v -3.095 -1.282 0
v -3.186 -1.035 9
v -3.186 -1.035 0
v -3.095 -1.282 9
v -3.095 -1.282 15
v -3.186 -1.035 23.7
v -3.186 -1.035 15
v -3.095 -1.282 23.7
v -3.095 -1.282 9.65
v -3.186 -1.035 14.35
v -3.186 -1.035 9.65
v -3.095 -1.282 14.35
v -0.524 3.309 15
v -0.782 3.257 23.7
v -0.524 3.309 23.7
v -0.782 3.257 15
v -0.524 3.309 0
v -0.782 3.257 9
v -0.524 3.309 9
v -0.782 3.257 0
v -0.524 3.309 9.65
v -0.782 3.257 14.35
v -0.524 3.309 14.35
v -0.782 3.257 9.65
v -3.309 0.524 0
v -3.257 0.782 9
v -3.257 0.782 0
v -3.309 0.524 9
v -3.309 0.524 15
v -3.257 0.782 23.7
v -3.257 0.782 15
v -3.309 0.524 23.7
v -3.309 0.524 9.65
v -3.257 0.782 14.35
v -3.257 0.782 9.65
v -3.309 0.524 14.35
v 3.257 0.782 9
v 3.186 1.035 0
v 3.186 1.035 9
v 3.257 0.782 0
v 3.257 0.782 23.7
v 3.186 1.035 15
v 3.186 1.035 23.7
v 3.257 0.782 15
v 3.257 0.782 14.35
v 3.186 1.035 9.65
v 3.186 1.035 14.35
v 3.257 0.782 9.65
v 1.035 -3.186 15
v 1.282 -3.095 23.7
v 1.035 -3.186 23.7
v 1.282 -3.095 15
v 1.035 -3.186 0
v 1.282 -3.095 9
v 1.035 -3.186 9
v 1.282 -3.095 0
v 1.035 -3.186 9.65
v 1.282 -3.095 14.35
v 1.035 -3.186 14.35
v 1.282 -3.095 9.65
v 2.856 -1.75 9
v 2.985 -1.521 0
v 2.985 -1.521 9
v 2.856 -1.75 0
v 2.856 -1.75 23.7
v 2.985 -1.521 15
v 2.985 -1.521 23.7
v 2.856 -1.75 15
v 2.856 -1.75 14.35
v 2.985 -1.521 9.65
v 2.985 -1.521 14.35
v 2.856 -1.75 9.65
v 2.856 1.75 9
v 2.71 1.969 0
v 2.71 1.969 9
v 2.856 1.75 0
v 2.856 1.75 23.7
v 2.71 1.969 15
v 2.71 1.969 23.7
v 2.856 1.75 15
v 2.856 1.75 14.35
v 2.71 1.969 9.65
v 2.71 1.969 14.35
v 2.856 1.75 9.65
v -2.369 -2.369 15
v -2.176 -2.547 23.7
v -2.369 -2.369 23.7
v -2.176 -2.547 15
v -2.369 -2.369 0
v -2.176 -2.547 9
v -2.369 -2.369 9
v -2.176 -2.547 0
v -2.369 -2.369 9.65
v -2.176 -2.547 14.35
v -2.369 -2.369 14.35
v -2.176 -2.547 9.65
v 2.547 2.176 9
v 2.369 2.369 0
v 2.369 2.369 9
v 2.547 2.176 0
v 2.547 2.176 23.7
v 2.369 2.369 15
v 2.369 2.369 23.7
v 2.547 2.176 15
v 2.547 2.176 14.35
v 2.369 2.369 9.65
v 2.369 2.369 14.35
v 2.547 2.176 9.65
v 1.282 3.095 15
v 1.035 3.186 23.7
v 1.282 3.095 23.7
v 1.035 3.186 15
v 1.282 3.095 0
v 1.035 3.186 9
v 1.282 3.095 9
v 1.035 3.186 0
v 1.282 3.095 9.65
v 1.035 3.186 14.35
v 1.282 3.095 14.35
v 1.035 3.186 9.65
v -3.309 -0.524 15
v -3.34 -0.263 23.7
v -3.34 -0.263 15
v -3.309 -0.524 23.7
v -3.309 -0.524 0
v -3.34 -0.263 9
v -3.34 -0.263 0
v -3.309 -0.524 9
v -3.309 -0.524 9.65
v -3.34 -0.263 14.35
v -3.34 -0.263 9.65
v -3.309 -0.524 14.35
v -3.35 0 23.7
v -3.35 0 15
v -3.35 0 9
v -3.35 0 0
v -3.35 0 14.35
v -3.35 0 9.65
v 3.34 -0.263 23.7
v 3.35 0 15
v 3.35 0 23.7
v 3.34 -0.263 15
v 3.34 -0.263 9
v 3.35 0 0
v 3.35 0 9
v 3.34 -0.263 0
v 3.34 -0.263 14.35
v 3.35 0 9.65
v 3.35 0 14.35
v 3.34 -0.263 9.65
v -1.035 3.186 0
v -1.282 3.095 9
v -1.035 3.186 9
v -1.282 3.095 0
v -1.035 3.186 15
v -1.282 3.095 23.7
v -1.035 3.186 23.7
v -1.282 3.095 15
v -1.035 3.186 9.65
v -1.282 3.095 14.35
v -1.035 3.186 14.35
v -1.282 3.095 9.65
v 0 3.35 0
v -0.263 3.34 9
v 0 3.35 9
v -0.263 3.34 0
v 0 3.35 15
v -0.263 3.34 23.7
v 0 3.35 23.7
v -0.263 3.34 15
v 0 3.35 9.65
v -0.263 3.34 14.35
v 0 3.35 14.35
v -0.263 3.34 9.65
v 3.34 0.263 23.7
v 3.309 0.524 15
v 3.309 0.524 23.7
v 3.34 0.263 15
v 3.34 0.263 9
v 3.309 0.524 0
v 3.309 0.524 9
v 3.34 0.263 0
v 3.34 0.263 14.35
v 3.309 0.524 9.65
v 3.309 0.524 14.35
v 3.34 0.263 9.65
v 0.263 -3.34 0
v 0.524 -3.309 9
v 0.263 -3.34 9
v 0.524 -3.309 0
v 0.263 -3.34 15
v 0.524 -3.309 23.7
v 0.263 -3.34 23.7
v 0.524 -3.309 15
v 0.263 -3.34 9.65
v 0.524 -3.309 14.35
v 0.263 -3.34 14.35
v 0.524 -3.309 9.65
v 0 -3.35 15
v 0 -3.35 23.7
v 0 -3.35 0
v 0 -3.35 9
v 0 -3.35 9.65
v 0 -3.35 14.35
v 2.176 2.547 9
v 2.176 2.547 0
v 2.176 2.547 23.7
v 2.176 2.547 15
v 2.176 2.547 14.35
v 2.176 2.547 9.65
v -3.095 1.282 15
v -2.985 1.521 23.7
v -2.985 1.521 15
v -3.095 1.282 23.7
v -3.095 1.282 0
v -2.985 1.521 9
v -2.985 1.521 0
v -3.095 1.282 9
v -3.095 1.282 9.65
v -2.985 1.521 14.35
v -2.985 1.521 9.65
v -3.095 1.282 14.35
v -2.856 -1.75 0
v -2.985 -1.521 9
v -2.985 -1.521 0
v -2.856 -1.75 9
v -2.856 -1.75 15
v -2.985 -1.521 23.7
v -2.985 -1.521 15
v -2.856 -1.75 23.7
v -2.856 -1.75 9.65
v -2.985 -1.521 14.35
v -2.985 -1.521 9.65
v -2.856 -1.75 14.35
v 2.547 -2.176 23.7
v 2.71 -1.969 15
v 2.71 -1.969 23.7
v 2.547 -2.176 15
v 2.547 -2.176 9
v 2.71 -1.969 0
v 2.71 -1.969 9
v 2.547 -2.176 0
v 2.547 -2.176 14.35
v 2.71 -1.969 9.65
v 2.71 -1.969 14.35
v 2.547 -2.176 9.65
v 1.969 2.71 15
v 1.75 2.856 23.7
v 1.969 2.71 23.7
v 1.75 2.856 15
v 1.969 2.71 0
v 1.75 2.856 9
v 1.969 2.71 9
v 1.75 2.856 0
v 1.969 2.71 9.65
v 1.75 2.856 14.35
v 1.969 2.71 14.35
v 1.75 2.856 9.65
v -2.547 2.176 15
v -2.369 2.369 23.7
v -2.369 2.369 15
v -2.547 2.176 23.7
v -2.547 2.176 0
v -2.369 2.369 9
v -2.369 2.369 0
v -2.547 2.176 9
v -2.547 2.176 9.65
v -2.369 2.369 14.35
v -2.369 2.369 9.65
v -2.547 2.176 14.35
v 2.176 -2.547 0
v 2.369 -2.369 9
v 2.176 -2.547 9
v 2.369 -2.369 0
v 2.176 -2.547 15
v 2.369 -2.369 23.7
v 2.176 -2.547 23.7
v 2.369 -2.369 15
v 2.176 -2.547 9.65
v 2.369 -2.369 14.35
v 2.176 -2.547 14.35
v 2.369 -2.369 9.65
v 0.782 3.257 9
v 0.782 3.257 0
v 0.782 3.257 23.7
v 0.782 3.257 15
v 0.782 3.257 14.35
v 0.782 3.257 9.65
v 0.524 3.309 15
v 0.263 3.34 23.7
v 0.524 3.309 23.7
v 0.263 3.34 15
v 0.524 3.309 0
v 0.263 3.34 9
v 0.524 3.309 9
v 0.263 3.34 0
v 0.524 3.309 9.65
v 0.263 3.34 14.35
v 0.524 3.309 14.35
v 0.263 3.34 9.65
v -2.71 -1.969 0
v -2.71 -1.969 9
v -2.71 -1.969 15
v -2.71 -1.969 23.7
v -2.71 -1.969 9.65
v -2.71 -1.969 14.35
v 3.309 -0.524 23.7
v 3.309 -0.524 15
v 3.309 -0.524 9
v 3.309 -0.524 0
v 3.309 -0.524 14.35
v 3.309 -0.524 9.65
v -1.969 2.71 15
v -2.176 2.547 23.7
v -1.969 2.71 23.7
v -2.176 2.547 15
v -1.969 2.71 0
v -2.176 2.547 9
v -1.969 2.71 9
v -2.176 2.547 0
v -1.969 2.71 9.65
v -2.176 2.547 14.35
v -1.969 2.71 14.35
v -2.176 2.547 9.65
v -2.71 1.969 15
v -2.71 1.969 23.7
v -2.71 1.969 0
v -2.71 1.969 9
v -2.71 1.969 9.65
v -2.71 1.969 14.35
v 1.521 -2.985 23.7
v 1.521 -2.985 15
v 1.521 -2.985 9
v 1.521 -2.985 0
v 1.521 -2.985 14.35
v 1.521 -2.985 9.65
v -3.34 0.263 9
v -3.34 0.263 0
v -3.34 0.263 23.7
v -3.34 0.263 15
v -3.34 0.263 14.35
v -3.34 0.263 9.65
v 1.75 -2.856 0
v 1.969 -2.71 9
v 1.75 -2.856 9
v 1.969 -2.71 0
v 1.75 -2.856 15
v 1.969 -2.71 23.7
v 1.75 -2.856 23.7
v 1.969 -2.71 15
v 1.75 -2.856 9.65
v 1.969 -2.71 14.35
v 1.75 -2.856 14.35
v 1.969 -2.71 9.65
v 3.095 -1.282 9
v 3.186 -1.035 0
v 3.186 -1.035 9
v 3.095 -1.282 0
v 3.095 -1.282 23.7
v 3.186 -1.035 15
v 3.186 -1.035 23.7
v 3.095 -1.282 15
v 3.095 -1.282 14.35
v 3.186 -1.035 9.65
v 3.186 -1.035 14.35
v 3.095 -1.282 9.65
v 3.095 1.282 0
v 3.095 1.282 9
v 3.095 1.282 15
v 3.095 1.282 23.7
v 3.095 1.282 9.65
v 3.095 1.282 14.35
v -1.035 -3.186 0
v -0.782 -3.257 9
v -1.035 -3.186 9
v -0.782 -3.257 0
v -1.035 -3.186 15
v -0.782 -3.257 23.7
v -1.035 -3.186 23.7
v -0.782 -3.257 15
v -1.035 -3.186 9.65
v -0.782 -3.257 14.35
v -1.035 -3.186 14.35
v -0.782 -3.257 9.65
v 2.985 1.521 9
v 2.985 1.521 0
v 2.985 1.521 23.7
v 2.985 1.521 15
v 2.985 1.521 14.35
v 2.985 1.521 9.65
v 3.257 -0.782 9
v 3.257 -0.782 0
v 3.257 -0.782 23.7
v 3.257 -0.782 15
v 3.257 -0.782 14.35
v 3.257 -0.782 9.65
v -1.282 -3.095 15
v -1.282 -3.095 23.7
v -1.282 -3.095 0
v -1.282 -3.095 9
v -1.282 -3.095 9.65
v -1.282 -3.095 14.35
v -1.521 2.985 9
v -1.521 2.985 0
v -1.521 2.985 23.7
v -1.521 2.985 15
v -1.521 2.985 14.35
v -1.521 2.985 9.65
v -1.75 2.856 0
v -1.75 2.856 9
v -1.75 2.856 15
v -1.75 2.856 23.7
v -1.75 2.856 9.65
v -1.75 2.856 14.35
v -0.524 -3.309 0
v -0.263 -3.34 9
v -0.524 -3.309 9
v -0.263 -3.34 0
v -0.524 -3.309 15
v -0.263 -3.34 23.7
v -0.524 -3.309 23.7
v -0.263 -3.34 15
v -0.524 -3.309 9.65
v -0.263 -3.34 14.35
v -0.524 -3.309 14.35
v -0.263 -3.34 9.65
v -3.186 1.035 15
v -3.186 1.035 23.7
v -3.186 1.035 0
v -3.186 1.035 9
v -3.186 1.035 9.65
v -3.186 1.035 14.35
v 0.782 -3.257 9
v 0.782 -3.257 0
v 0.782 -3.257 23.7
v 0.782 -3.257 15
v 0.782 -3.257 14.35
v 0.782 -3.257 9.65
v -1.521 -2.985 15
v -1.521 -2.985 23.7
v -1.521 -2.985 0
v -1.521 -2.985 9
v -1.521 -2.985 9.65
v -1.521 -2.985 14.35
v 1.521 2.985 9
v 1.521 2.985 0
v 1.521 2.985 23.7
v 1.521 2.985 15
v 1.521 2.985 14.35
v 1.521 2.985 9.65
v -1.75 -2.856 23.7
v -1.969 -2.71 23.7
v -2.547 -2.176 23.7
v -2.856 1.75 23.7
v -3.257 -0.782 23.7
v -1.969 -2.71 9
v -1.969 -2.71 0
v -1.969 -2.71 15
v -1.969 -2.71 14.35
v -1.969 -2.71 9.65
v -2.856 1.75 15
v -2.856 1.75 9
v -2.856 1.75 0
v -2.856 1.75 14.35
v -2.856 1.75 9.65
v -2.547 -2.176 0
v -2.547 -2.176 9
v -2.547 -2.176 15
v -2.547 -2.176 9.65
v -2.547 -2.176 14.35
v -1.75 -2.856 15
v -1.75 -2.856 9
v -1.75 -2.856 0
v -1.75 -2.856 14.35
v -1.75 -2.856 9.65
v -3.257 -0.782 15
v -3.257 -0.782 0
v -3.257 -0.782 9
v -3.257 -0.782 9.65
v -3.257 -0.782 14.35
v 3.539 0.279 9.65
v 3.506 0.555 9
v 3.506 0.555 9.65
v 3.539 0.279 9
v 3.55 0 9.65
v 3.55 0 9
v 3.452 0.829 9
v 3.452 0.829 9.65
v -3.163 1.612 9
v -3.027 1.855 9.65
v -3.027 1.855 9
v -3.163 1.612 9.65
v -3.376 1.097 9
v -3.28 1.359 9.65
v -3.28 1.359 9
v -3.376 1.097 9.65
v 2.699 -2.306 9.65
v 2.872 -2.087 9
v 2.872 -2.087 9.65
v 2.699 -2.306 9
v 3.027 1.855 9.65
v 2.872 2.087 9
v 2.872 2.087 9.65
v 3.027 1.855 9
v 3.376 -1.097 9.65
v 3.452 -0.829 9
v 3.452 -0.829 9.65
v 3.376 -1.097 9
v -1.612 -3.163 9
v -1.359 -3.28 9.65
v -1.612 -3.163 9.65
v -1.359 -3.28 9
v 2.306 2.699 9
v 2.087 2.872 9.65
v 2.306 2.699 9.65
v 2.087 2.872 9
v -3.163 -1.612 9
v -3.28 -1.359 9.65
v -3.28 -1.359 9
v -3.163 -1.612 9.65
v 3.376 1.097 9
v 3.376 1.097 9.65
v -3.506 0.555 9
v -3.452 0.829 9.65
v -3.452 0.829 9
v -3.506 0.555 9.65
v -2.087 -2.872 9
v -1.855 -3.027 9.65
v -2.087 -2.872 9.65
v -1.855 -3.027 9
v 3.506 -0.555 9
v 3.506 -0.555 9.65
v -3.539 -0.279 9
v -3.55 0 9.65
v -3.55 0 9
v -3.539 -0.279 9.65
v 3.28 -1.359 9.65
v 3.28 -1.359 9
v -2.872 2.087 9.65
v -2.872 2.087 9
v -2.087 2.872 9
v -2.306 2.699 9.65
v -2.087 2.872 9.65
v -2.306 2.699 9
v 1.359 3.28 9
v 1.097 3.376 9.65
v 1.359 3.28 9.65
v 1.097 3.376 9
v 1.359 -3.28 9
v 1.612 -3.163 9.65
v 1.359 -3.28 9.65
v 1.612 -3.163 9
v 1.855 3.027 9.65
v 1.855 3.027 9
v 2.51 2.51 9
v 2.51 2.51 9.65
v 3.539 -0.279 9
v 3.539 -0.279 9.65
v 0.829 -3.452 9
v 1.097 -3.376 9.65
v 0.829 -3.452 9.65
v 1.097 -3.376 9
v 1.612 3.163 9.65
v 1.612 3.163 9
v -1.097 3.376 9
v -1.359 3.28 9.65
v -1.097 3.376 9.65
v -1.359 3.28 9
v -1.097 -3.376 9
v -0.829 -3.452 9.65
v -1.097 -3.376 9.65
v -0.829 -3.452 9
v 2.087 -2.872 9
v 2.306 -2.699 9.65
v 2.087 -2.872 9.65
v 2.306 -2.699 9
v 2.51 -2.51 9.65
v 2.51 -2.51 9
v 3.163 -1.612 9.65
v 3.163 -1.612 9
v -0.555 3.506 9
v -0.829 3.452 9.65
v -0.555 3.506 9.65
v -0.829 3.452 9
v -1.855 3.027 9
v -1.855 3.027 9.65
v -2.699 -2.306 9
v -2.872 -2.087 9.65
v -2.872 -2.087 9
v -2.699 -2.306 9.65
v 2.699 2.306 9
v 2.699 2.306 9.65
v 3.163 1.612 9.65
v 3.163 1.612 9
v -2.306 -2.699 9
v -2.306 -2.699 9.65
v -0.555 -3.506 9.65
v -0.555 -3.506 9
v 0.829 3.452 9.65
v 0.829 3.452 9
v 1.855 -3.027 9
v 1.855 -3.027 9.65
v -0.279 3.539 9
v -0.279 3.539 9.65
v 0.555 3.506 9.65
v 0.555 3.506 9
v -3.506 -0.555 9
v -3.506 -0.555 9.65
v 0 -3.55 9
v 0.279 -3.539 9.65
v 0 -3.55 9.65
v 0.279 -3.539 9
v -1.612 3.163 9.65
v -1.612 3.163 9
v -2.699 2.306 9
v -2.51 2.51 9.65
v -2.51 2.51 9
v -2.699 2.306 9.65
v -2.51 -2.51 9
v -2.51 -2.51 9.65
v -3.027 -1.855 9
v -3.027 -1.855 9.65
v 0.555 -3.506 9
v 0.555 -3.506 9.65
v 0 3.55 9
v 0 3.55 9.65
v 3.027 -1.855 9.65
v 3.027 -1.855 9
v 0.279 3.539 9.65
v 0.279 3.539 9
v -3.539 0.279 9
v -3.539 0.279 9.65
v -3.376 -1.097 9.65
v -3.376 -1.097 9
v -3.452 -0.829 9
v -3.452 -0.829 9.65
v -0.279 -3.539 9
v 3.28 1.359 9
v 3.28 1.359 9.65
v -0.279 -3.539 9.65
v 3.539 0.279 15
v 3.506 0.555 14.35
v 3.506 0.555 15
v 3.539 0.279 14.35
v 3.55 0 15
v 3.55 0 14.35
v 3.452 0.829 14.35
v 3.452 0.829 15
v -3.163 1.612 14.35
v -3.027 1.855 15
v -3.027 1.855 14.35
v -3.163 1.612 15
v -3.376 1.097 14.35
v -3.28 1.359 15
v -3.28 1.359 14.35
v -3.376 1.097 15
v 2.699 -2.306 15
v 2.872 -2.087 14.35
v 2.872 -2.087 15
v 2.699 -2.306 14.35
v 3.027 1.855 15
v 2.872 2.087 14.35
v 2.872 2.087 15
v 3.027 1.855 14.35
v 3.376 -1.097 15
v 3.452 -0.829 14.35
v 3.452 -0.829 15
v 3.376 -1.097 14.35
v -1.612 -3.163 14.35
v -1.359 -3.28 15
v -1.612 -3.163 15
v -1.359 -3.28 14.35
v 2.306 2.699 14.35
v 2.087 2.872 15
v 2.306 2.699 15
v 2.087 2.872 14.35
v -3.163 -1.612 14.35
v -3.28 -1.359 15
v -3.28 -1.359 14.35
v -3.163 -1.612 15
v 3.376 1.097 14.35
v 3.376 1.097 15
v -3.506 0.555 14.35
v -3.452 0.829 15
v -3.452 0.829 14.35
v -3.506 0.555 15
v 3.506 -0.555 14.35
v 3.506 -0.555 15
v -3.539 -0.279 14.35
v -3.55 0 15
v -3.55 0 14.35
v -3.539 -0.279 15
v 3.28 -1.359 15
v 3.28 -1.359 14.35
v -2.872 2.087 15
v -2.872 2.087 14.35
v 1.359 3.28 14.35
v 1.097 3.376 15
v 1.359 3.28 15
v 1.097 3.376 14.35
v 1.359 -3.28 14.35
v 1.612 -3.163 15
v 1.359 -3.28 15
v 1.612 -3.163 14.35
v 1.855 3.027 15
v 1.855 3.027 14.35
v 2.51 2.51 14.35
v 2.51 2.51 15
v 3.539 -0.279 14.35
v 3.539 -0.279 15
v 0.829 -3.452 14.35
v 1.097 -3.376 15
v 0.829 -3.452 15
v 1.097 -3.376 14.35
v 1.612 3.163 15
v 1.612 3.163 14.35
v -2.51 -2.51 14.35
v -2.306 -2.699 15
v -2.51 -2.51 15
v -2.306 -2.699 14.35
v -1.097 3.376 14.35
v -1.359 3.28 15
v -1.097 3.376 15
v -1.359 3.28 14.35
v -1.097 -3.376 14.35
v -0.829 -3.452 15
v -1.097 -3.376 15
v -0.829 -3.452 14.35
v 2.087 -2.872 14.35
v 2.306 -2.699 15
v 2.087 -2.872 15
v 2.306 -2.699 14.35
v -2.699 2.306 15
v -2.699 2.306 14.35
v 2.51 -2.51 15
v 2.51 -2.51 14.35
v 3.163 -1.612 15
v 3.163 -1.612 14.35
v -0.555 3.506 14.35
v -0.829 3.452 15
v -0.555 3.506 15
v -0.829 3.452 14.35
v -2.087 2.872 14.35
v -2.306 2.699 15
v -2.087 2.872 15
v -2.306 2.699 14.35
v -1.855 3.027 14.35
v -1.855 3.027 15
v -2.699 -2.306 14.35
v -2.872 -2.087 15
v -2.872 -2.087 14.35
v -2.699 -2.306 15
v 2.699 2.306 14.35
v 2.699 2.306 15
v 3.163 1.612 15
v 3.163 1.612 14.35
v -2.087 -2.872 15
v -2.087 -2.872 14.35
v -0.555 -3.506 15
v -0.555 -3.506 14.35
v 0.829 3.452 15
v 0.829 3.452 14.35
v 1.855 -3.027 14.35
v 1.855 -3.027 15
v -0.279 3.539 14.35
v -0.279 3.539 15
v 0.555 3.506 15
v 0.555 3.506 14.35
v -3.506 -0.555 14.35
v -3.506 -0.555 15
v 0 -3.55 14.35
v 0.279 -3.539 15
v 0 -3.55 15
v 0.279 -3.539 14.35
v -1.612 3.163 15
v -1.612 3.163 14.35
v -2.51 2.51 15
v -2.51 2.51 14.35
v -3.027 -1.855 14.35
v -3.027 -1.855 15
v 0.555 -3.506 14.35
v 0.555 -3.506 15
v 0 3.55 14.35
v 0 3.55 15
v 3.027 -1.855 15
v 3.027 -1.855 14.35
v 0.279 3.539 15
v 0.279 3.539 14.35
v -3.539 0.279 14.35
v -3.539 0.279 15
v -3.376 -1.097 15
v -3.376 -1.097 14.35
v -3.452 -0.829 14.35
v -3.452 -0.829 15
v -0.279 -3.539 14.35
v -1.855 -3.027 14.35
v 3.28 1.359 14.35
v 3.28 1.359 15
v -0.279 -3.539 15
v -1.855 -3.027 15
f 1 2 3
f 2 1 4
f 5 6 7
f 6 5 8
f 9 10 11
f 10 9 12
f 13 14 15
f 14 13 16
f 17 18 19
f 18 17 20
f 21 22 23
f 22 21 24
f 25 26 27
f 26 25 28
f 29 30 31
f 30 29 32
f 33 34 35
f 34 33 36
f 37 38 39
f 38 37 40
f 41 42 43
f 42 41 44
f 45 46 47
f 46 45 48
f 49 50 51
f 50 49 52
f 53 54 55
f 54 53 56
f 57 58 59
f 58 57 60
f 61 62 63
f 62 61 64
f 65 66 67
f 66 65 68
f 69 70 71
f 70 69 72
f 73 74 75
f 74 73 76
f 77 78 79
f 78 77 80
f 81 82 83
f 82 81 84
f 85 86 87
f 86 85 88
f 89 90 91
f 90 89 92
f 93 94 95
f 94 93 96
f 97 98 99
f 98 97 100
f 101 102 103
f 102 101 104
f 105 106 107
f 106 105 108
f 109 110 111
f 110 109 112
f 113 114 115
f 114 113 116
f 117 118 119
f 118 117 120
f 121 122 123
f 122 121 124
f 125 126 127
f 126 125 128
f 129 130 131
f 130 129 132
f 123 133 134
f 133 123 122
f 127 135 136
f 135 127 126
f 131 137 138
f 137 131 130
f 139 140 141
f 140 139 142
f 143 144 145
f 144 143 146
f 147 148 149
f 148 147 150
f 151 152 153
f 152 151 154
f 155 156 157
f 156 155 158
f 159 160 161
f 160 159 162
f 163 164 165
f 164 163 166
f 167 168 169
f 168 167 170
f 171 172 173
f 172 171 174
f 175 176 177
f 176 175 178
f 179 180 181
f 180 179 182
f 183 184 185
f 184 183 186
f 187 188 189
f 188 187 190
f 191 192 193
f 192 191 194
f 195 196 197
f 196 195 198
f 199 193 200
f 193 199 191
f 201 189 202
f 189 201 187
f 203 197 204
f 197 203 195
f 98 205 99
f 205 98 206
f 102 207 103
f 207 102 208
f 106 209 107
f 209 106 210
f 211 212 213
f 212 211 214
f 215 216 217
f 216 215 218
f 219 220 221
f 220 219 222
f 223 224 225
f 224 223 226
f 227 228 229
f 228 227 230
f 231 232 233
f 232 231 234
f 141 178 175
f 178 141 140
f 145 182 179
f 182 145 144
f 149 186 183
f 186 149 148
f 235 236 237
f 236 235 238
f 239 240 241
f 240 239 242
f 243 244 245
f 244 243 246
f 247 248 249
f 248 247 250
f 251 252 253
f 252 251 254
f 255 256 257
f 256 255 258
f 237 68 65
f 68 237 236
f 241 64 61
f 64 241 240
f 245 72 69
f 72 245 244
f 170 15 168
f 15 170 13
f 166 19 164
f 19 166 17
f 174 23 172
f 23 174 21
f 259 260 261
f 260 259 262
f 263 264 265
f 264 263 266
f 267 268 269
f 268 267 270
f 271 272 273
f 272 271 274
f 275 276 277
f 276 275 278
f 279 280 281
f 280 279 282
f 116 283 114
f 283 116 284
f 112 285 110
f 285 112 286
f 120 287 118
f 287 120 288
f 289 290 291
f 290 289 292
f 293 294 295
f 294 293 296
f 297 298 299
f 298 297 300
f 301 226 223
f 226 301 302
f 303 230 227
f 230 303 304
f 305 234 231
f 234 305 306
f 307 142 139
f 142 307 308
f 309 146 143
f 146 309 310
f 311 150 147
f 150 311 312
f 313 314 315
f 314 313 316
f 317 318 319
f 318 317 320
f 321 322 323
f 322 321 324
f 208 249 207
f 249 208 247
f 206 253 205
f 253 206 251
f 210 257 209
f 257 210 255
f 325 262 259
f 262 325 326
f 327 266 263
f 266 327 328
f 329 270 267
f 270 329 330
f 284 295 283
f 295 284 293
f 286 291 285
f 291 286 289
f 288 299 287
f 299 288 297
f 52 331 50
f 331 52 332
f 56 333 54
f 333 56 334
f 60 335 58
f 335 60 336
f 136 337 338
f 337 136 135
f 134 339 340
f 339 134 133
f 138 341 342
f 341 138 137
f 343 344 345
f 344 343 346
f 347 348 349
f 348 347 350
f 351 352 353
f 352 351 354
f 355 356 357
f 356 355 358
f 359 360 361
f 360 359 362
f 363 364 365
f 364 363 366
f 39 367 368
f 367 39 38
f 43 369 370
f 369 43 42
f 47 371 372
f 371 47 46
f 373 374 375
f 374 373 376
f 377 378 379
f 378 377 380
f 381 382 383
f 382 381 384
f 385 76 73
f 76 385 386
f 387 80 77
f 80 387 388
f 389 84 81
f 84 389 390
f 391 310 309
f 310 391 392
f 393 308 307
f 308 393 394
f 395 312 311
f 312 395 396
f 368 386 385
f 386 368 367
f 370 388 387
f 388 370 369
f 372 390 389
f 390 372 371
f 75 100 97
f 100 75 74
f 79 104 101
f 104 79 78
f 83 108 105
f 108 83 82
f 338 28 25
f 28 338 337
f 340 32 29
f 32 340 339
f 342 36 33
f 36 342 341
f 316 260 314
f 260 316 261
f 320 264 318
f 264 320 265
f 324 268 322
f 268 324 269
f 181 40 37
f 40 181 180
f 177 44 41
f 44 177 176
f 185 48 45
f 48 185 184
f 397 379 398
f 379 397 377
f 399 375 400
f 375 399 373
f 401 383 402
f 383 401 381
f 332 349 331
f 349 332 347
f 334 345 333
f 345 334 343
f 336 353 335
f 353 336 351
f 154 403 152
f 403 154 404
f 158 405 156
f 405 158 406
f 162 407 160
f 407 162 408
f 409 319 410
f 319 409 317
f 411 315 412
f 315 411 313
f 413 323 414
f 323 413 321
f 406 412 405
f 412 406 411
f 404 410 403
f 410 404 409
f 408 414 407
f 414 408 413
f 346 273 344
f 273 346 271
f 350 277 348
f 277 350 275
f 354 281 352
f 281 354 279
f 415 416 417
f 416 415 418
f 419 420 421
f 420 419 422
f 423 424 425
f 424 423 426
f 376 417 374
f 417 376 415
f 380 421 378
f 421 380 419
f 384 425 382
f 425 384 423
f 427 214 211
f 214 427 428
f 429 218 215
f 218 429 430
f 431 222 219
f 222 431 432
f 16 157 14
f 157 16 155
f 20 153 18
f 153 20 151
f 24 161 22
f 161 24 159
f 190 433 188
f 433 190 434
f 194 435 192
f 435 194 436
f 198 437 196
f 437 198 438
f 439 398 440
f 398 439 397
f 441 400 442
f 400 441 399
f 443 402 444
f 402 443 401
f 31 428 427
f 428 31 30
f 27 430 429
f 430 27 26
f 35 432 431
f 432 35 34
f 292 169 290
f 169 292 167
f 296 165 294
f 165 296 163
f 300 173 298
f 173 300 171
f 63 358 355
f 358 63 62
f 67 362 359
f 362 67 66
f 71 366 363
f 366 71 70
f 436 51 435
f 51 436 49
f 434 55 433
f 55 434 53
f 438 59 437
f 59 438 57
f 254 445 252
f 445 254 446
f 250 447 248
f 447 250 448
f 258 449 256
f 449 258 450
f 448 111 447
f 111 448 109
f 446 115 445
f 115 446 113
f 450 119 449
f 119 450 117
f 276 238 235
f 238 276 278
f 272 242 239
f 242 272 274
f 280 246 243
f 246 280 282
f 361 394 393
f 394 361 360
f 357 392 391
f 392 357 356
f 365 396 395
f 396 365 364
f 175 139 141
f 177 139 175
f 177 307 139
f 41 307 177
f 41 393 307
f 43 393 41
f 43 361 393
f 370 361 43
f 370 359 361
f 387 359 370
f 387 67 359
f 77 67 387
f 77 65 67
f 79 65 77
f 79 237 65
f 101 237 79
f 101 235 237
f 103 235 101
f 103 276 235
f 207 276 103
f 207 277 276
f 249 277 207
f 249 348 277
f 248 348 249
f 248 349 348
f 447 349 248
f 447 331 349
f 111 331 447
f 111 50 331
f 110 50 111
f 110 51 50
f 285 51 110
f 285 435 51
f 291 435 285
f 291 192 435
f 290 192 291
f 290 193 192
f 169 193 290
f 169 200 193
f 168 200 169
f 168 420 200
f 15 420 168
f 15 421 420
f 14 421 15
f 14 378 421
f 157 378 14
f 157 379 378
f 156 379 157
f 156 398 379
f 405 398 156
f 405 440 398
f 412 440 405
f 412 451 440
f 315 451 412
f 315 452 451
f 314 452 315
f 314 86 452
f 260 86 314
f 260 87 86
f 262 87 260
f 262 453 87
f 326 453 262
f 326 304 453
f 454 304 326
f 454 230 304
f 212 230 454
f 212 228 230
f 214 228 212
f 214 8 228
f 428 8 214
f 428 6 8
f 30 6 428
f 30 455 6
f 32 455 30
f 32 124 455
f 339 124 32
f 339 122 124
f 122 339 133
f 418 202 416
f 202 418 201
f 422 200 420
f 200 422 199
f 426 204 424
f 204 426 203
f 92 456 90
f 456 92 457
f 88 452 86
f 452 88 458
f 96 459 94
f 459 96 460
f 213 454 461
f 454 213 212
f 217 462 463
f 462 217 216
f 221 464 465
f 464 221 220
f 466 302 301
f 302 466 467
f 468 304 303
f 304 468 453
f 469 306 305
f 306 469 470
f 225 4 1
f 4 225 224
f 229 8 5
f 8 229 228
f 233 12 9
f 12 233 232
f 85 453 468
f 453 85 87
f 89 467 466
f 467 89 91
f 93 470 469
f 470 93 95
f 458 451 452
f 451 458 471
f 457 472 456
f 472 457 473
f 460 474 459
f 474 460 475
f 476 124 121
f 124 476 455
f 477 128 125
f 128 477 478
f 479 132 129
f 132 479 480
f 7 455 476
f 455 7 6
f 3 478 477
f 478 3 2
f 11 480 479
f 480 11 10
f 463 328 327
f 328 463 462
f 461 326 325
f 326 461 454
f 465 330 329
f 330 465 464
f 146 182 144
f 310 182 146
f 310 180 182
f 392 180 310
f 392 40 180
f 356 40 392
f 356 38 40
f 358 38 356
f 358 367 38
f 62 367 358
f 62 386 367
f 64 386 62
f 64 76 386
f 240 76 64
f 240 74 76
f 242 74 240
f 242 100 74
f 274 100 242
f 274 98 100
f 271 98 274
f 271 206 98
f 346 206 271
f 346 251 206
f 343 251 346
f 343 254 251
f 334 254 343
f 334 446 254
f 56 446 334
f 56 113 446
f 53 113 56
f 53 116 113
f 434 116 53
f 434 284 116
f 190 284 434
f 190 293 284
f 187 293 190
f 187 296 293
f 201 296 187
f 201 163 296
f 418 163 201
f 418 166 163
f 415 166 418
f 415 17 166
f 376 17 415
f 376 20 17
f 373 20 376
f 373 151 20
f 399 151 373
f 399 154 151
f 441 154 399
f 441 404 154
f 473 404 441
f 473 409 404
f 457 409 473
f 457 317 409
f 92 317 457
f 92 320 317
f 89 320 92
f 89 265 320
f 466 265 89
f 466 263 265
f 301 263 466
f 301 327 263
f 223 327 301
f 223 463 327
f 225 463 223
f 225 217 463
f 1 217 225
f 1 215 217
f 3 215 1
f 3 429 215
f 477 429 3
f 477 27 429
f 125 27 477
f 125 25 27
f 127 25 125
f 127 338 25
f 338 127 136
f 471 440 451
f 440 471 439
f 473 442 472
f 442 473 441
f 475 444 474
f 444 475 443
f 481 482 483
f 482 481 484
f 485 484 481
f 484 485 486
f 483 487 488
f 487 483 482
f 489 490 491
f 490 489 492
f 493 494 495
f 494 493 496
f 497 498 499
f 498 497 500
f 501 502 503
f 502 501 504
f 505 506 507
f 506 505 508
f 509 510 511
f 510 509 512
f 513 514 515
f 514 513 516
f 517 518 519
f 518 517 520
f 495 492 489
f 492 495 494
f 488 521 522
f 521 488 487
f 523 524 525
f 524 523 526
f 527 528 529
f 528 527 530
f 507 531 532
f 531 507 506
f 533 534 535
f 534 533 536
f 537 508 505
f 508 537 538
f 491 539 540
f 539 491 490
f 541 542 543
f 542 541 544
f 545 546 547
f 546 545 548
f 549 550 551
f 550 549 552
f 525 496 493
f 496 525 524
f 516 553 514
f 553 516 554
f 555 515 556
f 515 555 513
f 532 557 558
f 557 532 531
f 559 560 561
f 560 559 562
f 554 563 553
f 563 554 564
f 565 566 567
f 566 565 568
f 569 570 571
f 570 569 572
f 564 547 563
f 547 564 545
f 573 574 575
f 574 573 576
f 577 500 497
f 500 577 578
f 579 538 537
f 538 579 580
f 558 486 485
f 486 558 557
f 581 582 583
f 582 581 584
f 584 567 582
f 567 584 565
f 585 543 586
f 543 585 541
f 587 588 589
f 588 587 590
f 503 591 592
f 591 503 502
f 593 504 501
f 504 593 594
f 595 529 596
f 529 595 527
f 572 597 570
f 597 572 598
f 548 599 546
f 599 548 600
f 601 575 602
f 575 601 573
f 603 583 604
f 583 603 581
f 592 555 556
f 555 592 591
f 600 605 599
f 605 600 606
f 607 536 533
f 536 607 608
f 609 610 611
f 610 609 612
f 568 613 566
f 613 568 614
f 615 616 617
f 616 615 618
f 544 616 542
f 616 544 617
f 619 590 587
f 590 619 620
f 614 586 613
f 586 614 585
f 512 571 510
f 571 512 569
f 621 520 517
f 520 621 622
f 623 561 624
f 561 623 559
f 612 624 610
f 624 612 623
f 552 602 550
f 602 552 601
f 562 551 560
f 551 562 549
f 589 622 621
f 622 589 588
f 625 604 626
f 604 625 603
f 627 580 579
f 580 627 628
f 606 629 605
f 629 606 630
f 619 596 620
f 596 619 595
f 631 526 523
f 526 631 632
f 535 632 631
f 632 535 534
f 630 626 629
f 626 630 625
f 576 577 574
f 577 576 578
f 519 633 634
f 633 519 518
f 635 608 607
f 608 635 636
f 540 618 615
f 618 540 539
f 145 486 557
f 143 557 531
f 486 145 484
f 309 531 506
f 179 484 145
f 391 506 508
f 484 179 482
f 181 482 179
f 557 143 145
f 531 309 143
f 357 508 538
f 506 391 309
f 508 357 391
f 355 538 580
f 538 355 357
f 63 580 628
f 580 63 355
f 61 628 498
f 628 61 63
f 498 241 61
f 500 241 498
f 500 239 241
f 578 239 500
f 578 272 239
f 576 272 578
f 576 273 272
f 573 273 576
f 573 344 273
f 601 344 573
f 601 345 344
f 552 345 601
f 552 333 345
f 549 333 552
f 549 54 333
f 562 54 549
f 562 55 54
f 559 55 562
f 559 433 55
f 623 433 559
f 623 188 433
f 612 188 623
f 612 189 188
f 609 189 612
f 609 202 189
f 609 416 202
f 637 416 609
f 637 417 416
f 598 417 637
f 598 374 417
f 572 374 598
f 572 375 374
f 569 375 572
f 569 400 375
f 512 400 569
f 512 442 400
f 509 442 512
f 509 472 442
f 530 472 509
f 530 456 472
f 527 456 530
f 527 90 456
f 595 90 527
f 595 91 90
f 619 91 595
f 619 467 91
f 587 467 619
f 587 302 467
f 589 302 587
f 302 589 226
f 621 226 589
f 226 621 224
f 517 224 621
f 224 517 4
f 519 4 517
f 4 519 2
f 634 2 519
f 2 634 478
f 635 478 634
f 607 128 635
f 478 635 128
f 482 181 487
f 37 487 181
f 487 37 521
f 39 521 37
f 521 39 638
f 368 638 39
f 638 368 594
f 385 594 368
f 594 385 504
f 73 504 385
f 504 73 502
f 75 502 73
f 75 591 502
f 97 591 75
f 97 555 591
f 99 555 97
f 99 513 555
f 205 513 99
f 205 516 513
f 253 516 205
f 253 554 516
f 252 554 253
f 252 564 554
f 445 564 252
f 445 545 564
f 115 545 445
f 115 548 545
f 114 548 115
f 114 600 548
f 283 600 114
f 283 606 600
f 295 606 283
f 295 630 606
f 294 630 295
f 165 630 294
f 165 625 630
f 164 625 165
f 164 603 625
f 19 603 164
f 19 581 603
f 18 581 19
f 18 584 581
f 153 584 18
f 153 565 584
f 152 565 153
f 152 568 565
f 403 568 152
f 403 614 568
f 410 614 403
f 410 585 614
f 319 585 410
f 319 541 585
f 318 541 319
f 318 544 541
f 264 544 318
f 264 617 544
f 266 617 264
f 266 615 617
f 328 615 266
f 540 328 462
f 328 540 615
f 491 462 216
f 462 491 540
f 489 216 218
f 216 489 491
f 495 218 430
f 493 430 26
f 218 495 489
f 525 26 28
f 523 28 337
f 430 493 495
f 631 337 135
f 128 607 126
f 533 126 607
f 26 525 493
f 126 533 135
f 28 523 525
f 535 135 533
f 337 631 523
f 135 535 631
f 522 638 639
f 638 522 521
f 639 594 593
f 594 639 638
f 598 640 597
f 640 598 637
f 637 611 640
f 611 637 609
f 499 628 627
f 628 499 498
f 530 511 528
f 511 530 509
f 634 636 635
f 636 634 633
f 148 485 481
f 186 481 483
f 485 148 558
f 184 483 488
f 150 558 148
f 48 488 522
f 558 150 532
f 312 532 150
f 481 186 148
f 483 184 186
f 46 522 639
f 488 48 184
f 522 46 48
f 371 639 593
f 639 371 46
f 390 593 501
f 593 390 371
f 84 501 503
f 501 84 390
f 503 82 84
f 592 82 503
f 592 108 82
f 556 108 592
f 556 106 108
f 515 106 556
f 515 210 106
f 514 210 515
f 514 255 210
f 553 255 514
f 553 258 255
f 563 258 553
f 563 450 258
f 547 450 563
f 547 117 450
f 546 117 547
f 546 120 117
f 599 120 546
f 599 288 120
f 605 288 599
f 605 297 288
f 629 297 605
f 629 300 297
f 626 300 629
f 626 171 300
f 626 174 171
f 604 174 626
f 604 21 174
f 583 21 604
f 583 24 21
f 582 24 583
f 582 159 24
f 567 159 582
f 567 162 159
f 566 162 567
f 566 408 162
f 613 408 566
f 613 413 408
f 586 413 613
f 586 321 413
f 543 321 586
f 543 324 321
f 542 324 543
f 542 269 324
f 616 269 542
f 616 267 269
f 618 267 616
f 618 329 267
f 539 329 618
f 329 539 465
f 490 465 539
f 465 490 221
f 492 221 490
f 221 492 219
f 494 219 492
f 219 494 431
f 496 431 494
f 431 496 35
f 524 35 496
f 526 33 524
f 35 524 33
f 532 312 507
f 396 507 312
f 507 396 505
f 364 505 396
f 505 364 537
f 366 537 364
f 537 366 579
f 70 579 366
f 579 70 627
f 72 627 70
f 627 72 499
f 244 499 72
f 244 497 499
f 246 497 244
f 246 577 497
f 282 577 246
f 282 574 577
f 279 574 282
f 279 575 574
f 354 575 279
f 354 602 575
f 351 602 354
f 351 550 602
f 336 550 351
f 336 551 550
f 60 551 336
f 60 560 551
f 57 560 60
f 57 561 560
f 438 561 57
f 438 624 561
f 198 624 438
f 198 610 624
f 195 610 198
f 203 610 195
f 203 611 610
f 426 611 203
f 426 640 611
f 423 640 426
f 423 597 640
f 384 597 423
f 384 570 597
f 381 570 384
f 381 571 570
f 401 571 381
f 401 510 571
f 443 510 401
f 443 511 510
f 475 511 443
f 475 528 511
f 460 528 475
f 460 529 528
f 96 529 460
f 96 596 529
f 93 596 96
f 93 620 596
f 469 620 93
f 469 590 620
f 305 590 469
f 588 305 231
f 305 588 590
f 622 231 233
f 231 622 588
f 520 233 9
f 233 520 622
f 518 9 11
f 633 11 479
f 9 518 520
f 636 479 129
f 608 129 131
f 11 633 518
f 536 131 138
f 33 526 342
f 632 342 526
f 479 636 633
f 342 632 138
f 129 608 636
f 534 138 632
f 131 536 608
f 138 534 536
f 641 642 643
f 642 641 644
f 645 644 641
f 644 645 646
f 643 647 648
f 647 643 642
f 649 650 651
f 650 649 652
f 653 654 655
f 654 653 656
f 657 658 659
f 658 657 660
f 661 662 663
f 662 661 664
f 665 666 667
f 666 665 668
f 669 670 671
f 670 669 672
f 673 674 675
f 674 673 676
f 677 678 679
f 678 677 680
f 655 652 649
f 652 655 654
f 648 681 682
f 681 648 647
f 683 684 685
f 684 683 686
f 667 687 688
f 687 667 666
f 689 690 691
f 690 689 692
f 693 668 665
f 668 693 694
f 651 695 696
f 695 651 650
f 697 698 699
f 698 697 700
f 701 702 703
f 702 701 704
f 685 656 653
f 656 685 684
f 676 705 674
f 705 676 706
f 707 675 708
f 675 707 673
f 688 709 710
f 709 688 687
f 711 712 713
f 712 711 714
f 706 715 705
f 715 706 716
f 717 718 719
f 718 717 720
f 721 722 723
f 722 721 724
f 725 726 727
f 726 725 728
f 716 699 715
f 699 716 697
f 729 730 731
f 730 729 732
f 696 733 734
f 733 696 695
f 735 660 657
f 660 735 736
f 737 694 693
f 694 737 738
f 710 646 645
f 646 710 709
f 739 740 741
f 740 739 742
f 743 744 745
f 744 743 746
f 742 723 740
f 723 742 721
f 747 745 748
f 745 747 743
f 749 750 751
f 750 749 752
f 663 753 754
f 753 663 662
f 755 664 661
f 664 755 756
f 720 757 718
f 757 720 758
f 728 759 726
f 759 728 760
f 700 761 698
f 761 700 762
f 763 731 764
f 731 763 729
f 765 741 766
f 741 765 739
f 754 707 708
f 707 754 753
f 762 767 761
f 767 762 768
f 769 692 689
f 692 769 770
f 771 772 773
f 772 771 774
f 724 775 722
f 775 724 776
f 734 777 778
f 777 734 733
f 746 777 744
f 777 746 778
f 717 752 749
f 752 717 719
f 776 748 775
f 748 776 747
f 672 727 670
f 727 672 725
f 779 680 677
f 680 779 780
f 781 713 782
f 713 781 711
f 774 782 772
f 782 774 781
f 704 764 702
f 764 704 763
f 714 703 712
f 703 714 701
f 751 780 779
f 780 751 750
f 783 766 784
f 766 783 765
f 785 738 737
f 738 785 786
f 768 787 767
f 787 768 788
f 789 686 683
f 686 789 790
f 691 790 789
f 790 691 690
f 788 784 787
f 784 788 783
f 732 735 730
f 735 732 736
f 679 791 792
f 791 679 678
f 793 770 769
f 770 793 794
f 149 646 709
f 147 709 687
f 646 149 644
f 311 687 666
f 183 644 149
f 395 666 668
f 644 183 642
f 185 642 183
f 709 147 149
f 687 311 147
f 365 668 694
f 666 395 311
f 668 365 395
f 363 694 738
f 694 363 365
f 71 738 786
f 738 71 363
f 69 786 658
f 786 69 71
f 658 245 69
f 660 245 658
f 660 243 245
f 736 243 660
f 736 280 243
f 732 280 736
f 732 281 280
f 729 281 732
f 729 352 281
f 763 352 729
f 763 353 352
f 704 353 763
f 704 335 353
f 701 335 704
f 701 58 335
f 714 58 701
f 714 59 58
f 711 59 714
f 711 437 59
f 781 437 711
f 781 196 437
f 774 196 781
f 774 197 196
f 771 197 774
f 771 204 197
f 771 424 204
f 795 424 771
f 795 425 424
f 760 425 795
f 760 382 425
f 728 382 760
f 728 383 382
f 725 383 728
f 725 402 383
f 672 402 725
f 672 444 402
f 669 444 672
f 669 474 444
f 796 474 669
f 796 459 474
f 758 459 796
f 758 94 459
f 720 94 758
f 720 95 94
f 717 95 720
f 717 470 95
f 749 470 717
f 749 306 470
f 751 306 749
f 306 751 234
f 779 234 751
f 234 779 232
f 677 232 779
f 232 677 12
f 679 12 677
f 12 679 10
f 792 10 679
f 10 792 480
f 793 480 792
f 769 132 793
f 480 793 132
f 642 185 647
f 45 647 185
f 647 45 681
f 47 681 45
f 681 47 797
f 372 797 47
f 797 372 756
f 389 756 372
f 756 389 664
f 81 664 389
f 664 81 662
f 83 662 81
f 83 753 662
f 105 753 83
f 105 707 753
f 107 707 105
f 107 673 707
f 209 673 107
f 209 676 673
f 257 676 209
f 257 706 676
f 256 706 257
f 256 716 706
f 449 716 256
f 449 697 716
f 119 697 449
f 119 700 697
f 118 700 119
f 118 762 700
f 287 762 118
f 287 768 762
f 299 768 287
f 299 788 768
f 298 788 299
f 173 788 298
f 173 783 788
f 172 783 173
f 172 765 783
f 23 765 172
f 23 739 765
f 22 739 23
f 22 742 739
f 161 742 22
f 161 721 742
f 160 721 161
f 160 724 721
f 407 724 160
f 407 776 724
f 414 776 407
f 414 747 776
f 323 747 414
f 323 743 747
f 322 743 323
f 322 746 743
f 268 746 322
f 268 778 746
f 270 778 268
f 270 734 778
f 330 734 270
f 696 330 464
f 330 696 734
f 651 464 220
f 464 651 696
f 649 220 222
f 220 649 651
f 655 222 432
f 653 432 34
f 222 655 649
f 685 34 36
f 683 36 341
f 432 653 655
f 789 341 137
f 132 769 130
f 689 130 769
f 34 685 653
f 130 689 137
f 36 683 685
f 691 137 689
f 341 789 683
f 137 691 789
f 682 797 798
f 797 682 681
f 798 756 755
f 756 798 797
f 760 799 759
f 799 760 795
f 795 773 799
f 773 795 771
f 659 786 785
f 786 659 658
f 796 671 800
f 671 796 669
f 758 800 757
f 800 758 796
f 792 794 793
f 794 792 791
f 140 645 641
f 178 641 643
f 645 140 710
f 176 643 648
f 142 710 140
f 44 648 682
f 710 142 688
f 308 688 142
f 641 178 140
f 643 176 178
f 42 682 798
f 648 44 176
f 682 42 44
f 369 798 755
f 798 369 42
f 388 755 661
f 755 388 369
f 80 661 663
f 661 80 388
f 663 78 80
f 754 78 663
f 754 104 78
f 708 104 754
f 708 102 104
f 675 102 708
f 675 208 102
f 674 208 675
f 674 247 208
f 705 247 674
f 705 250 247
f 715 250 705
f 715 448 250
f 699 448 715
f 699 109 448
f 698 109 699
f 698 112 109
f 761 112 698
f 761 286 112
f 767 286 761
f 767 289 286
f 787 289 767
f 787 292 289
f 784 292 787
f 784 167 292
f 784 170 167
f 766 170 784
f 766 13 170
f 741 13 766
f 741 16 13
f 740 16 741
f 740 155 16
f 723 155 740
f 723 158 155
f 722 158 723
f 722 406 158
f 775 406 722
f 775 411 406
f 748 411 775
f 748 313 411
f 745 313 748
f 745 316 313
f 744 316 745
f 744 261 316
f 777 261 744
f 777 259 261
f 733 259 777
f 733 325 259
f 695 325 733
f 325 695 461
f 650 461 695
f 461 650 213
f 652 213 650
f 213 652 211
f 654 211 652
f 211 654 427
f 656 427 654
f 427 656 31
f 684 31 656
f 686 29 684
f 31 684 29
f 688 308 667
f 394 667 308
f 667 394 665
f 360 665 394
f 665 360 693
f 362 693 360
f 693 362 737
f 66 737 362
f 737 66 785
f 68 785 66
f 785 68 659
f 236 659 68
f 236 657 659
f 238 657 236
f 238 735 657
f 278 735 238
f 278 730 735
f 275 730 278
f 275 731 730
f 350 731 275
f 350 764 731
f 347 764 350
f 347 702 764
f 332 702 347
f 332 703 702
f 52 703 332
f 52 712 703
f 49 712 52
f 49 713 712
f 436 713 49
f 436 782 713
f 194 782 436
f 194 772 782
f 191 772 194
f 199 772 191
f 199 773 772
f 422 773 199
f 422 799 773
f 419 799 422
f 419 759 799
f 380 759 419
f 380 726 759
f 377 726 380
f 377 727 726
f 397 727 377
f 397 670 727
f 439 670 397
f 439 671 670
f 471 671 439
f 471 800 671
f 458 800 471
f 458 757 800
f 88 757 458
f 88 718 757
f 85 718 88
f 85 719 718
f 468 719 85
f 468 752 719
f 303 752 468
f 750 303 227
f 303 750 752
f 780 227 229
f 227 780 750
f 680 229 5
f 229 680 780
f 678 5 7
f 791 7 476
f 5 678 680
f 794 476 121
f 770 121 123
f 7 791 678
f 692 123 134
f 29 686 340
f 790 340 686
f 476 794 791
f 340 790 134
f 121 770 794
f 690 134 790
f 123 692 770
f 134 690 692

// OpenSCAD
plugLength = 23.7;
plugDiameter = 6.7;
frictionRingsDiameter = 7.1;
frictionRing1Pos = 9;
frictionRing2Pos = 14.35;
$fn=80*1;

cylinder(plugLength, d=plugDiameter, true);
translate([0, 0, frictionRing1Pos]) {
    cylinder(0.65, d=frictionRingsDiameter, true);
}

translate([0, 0, frictionRing2Pos]) {
    cylinder(0.65, d=frictionRingsDiameter, true);
}
